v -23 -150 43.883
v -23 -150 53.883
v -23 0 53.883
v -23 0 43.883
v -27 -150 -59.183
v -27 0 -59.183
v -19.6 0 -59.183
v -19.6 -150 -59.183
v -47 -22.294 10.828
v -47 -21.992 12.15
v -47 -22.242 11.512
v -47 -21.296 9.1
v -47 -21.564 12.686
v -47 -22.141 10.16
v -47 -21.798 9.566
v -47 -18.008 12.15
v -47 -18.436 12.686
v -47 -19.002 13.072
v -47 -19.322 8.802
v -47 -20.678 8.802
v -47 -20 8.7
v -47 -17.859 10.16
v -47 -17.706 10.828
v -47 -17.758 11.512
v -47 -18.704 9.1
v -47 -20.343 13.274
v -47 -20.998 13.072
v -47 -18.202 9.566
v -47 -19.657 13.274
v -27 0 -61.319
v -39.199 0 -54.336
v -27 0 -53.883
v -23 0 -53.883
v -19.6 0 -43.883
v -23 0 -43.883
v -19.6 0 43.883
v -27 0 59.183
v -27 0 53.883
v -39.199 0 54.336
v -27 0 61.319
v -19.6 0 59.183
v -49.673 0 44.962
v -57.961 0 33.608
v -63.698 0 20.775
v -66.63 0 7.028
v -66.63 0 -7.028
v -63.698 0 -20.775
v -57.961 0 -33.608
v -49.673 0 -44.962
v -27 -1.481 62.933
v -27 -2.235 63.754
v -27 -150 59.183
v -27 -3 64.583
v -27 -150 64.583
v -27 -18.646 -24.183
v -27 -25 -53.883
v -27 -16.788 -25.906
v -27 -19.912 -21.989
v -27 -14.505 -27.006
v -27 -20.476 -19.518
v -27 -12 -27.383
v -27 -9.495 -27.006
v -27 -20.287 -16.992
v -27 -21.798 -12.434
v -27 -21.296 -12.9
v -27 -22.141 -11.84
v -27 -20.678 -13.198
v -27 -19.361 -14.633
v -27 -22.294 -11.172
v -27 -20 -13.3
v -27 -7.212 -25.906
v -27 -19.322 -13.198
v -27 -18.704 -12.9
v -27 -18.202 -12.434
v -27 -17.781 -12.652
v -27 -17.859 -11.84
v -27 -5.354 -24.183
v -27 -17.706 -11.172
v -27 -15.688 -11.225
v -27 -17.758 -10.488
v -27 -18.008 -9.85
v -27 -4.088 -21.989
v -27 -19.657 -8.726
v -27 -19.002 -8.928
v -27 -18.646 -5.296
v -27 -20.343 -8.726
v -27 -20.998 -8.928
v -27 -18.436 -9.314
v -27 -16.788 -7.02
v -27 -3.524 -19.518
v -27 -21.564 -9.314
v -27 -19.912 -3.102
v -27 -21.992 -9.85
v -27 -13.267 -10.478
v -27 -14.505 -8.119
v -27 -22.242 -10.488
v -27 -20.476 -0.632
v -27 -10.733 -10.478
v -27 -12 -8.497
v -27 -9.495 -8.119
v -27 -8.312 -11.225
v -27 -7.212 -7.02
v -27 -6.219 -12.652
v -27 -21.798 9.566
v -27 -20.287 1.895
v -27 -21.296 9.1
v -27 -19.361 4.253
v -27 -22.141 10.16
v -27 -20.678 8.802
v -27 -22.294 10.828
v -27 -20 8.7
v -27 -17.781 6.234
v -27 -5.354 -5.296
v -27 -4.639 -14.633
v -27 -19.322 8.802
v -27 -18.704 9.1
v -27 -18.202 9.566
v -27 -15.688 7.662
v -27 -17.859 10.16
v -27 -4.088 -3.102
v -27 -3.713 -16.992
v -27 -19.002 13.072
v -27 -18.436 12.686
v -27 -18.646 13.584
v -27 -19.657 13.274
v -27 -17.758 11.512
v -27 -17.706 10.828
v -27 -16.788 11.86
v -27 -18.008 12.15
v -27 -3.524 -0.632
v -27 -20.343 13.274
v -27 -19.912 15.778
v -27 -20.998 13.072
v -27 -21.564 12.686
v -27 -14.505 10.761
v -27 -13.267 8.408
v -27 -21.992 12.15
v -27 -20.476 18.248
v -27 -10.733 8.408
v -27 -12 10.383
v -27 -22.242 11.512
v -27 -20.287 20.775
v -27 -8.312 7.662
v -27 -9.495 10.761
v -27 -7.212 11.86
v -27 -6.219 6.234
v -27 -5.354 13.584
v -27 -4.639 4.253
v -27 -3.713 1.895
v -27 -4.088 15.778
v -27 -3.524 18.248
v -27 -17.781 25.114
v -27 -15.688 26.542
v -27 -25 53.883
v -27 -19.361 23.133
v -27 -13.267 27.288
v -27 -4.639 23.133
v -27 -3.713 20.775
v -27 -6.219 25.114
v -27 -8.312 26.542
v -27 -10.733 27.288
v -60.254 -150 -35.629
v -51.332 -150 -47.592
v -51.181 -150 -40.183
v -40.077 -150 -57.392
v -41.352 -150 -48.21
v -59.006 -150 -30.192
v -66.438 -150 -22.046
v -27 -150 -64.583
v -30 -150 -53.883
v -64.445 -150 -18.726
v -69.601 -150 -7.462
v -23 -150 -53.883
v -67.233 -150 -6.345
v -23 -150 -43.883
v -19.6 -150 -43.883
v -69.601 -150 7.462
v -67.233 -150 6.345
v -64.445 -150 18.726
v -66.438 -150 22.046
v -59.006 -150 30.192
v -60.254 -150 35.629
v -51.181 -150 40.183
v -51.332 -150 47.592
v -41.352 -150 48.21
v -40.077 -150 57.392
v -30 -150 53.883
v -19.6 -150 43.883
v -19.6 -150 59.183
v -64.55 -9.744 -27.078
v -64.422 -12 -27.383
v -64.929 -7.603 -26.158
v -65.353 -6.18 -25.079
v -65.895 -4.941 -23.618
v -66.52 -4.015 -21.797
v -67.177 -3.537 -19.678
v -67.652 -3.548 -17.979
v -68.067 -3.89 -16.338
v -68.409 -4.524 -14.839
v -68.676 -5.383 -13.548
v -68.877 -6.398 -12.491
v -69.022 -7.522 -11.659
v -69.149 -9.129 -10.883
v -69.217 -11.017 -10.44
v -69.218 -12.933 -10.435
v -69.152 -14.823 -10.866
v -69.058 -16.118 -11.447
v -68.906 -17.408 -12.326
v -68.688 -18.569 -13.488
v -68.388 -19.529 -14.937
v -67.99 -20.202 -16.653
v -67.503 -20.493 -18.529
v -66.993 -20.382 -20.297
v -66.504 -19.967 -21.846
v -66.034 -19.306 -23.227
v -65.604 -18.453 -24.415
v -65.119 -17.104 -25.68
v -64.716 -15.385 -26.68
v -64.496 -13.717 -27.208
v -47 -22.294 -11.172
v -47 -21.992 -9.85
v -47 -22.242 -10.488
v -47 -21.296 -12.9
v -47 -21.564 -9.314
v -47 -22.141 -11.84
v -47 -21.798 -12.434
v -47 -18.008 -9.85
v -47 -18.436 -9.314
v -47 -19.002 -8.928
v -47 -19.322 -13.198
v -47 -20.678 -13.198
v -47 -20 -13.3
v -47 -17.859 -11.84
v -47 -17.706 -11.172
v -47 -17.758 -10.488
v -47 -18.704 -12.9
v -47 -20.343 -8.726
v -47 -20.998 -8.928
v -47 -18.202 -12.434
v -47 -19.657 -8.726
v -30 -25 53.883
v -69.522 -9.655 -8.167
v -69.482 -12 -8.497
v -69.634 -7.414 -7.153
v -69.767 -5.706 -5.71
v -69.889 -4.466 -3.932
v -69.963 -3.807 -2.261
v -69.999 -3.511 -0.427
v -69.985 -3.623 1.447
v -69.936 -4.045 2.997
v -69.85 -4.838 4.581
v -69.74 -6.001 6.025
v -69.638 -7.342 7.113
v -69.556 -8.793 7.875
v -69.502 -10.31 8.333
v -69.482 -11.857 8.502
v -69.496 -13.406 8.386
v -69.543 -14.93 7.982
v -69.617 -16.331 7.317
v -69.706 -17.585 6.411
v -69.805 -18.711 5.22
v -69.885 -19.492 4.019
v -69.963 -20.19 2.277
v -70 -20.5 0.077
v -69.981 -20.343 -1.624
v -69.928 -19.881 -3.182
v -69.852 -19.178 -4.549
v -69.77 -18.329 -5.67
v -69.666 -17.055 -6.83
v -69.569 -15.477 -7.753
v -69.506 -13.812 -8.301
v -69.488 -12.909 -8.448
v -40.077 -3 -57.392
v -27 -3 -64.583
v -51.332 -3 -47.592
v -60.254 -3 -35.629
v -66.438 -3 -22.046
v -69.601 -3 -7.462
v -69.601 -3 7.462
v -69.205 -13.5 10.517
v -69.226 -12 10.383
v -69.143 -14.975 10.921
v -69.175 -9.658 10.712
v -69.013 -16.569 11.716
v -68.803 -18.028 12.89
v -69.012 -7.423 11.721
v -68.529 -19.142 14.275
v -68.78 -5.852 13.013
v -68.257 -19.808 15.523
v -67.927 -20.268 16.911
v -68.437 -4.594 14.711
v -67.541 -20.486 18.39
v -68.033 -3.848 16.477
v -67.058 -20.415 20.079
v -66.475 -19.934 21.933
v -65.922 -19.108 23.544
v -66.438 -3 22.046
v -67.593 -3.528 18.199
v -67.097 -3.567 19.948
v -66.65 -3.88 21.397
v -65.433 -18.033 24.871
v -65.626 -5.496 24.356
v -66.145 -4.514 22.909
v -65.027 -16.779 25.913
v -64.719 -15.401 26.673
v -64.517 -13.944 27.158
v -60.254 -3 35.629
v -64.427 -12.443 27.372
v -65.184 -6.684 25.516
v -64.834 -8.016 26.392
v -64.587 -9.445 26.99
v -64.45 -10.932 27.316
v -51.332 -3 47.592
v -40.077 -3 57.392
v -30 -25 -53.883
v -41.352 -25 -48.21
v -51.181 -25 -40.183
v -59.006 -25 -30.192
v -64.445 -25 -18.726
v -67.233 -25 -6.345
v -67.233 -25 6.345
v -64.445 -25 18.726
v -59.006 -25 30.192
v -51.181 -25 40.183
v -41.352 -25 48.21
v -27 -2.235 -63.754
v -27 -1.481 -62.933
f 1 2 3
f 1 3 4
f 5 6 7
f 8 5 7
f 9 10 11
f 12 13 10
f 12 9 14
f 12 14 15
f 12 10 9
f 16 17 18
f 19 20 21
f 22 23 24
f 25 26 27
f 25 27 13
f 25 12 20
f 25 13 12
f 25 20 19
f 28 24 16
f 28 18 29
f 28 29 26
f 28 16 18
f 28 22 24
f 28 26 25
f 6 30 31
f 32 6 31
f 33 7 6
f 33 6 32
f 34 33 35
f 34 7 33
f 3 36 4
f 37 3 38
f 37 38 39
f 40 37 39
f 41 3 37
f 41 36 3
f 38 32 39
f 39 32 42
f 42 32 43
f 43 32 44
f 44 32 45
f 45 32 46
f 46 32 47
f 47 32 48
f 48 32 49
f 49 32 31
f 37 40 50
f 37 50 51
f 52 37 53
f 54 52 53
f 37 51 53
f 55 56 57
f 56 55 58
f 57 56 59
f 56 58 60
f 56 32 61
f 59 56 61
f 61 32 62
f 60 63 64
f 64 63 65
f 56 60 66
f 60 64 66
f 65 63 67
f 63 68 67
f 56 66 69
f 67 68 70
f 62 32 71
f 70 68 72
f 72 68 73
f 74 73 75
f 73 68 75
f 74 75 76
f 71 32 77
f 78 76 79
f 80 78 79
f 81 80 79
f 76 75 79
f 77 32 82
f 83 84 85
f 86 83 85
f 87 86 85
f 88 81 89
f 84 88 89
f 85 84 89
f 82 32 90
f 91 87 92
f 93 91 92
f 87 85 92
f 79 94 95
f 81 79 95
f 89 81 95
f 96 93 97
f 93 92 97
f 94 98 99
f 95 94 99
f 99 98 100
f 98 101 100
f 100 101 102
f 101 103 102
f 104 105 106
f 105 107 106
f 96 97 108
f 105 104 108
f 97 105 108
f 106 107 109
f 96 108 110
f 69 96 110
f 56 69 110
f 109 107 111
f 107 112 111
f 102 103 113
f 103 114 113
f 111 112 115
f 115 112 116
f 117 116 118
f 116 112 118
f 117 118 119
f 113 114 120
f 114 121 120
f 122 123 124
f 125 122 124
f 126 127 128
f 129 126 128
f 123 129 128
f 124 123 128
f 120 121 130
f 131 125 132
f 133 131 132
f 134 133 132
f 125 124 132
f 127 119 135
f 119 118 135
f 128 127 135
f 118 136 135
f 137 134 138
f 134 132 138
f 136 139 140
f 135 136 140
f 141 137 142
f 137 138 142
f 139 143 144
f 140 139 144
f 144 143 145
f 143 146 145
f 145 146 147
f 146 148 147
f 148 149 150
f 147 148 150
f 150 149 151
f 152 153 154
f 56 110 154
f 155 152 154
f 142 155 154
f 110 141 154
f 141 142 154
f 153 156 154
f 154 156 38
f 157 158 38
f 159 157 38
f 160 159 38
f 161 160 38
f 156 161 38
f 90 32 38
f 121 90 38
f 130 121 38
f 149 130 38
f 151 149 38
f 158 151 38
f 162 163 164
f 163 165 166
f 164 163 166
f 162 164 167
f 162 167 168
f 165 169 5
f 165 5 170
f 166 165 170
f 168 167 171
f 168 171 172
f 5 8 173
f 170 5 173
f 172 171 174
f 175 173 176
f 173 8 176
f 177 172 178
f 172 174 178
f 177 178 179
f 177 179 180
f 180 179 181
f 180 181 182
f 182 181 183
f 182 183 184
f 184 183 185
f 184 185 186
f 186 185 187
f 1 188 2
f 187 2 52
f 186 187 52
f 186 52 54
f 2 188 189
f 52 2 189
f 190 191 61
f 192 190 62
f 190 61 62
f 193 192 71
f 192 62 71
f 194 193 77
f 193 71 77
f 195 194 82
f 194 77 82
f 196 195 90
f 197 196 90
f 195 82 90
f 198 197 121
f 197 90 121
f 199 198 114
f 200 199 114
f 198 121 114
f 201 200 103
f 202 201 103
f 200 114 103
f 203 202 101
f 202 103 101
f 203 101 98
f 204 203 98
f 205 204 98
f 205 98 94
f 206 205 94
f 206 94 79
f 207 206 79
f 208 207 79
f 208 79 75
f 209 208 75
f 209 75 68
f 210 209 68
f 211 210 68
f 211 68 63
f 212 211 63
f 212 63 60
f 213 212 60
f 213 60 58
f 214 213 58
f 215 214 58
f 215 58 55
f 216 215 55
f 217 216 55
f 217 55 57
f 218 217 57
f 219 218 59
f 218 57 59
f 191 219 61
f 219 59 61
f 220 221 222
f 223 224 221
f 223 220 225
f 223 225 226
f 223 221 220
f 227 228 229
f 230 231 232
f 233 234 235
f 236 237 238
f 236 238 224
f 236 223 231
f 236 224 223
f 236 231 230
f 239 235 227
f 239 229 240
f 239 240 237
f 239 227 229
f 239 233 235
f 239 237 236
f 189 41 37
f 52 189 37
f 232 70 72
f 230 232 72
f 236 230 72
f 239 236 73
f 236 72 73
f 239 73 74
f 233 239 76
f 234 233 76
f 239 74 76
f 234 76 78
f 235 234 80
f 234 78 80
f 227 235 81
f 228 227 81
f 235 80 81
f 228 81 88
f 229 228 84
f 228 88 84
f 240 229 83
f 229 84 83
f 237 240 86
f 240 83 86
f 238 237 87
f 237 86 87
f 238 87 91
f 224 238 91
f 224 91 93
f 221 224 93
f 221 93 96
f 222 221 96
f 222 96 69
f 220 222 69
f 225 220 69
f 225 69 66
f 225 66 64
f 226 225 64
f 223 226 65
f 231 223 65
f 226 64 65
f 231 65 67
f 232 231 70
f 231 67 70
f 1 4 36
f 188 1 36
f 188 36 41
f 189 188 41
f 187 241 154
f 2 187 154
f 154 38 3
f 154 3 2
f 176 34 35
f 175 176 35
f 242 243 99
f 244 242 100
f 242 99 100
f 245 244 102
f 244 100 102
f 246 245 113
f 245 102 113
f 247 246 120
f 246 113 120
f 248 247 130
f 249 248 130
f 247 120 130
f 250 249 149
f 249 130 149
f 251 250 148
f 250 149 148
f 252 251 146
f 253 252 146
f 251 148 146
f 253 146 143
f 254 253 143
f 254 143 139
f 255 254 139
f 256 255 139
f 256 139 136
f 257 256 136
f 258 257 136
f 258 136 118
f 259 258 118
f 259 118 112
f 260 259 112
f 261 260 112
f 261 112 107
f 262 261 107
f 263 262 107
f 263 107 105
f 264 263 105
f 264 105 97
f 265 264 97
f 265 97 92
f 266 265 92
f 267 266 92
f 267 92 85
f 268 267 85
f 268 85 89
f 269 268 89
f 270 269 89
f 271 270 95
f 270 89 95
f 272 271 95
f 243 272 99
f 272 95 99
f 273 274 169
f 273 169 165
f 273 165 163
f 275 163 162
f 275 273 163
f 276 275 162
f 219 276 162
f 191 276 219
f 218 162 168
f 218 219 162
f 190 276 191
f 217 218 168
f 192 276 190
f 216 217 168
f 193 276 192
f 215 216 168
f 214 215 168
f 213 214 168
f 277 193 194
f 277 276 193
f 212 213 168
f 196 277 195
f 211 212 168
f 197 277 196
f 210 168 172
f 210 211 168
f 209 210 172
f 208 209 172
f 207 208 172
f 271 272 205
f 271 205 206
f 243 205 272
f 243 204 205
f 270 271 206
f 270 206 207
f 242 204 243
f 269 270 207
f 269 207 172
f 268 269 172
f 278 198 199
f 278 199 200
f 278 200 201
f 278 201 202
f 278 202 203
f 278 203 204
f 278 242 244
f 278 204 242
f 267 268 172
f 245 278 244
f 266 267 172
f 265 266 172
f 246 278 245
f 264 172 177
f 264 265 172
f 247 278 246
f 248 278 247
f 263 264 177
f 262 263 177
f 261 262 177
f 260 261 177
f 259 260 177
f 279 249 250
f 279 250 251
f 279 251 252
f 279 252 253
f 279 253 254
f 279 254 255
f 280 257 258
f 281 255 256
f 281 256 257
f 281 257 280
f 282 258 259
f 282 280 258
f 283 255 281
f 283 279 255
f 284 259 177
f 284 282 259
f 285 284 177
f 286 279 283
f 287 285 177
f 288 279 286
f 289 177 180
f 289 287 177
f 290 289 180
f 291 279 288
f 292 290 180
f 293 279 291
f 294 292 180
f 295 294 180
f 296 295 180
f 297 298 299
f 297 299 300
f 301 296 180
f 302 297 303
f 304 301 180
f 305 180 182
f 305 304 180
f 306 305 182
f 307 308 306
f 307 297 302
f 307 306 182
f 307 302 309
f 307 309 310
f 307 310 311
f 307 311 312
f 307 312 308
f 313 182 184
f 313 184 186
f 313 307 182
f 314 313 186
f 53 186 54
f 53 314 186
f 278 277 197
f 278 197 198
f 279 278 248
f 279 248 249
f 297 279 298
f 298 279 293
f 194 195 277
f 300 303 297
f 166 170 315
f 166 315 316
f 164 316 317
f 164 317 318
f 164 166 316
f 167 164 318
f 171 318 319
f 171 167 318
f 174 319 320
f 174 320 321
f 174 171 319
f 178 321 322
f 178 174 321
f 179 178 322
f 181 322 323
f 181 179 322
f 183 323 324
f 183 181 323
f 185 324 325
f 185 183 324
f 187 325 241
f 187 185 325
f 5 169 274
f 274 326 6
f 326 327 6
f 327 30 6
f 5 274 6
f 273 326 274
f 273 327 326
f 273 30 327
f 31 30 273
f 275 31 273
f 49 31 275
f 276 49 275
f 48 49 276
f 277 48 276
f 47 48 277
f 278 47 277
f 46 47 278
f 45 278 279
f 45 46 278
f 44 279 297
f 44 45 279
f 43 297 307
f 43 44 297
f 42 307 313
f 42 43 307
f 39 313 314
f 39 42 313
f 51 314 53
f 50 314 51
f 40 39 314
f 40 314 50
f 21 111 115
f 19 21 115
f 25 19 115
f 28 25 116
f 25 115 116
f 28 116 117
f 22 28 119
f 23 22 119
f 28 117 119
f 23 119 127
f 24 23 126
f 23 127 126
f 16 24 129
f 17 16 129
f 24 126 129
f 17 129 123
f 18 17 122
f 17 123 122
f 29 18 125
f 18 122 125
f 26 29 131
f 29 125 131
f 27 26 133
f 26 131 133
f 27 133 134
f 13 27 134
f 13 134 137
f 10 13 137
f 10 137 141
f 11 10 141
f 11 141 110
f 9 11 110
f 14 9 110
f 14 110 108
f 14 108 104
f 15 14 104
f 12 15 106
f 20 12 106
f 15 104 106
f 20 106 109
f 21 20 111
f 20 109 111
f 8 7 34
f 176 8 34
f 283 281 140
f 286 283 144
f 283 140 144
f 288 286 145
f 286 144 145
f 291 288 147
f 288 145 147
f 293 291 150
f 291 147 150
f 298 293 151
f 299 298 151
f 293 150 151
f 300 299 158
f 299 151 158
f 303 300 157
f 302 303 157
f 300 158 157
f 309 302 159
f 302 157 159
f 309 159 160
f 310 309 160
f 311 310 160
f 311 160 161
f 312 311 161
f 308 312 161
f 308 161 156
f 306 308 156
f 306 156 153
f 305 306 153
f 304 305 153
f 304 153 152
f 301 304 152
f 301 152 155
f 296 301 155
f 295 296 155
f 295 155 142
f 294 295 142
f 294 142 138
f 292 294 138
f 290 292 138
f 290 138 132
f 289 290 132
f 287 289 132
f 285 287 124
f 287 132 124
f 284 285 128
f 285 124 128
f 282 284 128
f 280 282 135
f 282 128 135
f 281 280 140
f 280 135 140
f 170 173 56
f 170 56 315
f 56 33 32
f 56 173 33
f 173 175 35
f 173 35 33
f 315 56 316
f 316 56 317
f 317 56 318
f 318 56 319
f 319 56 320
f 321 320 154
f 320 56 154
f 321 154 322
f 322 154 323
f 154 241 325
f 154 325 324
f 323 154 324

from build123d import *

# Parameters (mm, degrees)
ESQUISSE1_R             = 70
BOSS_EXTRU_1_DEPTH      = 150
ENL_V_MAT_EXTRU_1_DEPTH = 150
ENL_V_MAT_EXTRU_2_DEPTH = 180.008379692
ESQUISSE4_R             = 2.3
ENL_V_MAT_EXTRU_3_DEPTH = 20
ENL_V_MAT_EXTRU_4_DEPTH = 125
CHANFREIN1_SIZE         = 3
ESQUISSE6_R             = 8.5
ENL_V_MAT_EXTRU_5_DEPTH = 50


with BuildPart() as part:
    # Esquisse1 → Boss.-Extru.1 (new body)
    with BuildSketch(Plane(origin=(0, 0, 0), x_dir=(1, 0, 0), z_dir=(0, 1, 0))):
        with Locations(Location((0, 0, 0), (0, 0, 270))):
            Circle(ESQUISSE1_R)
    extrude(amount=-BOSS_EXTRU_1_DEPTH)

    # Esquisse2 → Enlèv. mat.-Extru.1 (cut)
    with BuildSketch(Plane(origin=(0, 0, 0), x_dir=(1, 0, 0), z_dir=(0, 1, 0))):
        with BuildLine():
            Line((-16, 68.14690015), (-16, 62.94690015))
            Line((-16, 62.94690015), (-8, 62.94690015))
            Line((-8, 62.94690015), (-8, 47.74690015))
            Line((-8, 47.74690015), (-12.8, 47.74690015))
            Line((-12.8, 47.74690015), (-12.8, 57.44690015))
            Line((-12.8, 57.44690015), (-16, 57.44690015))
            Line((-16, 57.44690015), (-16, -57.74690015))
            Line((-16, -57.74690015), (-12.8, -57.74690015))
            Line((-12.8, -57.74690015), (-12.8, -48.04690015))
            Line((-12.8, -48.04690015), (-8, -48.04690015))
            Line((-8, -48.04690015), (-8, -62.94690015))
            Line((-8, -62.94690015), (-16, -62.94690015))
            Line((-16, -62.94690015), (-16, -68.14690015))
            ThreePointArc((-16, -68.14690015), (70, 0), (-16, 68.14690015))
        make_face()
    extrude(amount=-ENL_V_MAT_EXTRU_1_DEPTH, mode=Mode.SUBTRACT)

    # Esquisse3 → Enlèv. mat.-Extru.2 (cut, through all)
    with BuildSketch(Plane(origin=(0, 0, 0), x_dir=(1, 0, 0), z_dir=(0, 1, 0))):
        Polygon((-27, 353.626649736), (-27, 64.58327957), (-27, 59.18327957), (-19.6, 59.18327957), (-19.6, 43.88327957), (-23, 43.88327957), (-23, 53.88327957), (-27, 53.88327957), (-27, -53.88327957), (-23, -53.88327957), (-23, -43.88327957), (-19.6, -43.88327957), (-19.6, -59.18327957), (-27, -59.18327957), (-27, -64.58327957), (-27, -353.626649736), (551.086740331, -353.626649736), (551.086740331, 353.626649736), align=None)
    extrude(amount=-ENL_V_MAT_EXTRU_2_DEPTH, mode=Mode.SUBTRACT)

    # Esquisse4 → Enlèv. mat.-Extru.3 (cut)
    with BuildSketch(Plane(origin=(-27, 0, 0), x_dir=(0, 0, -1), z_dir=(1, 0, 0))):
        with Locations((-11, -20)):
            Circle(ESQUISSE4_R)
        with Locations((11, -20)):
            Circle(ESQUISSE4_R)
    extrude(amount=-ENL_V_MAT_EXTRU_3_DEPTH, mode=Mode.SUBTRACT)

    # Esquisse5 → Enlèv. mat.-Extru.4 (cut)
    with BuildSketch(Plane.XZ.offset(150)):
        with BuildLine():
            Line((-27, 53.88327957), (-27, -53.88327957))
            Line((-27, -53.88327957), (-30, -53.88327957))
            ThreePointArc((-30, -53.88327957), (-67.584422787, 0), (-30, 53.88327957))
            Line((-30, 53.88327957), (-27, 53.88327957))
        make_face()
    extrude(amount=-ENL_V_MAT_EXTRU_4_DEPTH, mode=Mode.SUBTRACT)

    # Chanfrein1
    chanfrein1_edges = [part.edges().sort_by_distance(p)[0] for p in [
        (-70, 0, 0),
    ]]
    chamfer(chanfrein1_edges, length=CHANFREIN1_SIZE)

    # Esquisse6 → Enlèv. mat.-Extru.5 (cut)
    with BuildSketch(Plane(origin=(-27, 0, 0), x_dir=(0, 0, -1), z_dir=(1, 0, 0))):
        with Locations((-18.88327957, -12)):
            Circle(ESQUISSE6_R)
        with Locations((18.88327957, -12)):
            Circle(ESQUISSE6_R)
        with Locations((-0.00327957, -12)):
            Circle(ESQUISSE6_R)
    extrude(amount=-ENL_V_MAT_EXTRU_5_DEPTH, mode=Mode.SUBTRACT)


solid = part.part
